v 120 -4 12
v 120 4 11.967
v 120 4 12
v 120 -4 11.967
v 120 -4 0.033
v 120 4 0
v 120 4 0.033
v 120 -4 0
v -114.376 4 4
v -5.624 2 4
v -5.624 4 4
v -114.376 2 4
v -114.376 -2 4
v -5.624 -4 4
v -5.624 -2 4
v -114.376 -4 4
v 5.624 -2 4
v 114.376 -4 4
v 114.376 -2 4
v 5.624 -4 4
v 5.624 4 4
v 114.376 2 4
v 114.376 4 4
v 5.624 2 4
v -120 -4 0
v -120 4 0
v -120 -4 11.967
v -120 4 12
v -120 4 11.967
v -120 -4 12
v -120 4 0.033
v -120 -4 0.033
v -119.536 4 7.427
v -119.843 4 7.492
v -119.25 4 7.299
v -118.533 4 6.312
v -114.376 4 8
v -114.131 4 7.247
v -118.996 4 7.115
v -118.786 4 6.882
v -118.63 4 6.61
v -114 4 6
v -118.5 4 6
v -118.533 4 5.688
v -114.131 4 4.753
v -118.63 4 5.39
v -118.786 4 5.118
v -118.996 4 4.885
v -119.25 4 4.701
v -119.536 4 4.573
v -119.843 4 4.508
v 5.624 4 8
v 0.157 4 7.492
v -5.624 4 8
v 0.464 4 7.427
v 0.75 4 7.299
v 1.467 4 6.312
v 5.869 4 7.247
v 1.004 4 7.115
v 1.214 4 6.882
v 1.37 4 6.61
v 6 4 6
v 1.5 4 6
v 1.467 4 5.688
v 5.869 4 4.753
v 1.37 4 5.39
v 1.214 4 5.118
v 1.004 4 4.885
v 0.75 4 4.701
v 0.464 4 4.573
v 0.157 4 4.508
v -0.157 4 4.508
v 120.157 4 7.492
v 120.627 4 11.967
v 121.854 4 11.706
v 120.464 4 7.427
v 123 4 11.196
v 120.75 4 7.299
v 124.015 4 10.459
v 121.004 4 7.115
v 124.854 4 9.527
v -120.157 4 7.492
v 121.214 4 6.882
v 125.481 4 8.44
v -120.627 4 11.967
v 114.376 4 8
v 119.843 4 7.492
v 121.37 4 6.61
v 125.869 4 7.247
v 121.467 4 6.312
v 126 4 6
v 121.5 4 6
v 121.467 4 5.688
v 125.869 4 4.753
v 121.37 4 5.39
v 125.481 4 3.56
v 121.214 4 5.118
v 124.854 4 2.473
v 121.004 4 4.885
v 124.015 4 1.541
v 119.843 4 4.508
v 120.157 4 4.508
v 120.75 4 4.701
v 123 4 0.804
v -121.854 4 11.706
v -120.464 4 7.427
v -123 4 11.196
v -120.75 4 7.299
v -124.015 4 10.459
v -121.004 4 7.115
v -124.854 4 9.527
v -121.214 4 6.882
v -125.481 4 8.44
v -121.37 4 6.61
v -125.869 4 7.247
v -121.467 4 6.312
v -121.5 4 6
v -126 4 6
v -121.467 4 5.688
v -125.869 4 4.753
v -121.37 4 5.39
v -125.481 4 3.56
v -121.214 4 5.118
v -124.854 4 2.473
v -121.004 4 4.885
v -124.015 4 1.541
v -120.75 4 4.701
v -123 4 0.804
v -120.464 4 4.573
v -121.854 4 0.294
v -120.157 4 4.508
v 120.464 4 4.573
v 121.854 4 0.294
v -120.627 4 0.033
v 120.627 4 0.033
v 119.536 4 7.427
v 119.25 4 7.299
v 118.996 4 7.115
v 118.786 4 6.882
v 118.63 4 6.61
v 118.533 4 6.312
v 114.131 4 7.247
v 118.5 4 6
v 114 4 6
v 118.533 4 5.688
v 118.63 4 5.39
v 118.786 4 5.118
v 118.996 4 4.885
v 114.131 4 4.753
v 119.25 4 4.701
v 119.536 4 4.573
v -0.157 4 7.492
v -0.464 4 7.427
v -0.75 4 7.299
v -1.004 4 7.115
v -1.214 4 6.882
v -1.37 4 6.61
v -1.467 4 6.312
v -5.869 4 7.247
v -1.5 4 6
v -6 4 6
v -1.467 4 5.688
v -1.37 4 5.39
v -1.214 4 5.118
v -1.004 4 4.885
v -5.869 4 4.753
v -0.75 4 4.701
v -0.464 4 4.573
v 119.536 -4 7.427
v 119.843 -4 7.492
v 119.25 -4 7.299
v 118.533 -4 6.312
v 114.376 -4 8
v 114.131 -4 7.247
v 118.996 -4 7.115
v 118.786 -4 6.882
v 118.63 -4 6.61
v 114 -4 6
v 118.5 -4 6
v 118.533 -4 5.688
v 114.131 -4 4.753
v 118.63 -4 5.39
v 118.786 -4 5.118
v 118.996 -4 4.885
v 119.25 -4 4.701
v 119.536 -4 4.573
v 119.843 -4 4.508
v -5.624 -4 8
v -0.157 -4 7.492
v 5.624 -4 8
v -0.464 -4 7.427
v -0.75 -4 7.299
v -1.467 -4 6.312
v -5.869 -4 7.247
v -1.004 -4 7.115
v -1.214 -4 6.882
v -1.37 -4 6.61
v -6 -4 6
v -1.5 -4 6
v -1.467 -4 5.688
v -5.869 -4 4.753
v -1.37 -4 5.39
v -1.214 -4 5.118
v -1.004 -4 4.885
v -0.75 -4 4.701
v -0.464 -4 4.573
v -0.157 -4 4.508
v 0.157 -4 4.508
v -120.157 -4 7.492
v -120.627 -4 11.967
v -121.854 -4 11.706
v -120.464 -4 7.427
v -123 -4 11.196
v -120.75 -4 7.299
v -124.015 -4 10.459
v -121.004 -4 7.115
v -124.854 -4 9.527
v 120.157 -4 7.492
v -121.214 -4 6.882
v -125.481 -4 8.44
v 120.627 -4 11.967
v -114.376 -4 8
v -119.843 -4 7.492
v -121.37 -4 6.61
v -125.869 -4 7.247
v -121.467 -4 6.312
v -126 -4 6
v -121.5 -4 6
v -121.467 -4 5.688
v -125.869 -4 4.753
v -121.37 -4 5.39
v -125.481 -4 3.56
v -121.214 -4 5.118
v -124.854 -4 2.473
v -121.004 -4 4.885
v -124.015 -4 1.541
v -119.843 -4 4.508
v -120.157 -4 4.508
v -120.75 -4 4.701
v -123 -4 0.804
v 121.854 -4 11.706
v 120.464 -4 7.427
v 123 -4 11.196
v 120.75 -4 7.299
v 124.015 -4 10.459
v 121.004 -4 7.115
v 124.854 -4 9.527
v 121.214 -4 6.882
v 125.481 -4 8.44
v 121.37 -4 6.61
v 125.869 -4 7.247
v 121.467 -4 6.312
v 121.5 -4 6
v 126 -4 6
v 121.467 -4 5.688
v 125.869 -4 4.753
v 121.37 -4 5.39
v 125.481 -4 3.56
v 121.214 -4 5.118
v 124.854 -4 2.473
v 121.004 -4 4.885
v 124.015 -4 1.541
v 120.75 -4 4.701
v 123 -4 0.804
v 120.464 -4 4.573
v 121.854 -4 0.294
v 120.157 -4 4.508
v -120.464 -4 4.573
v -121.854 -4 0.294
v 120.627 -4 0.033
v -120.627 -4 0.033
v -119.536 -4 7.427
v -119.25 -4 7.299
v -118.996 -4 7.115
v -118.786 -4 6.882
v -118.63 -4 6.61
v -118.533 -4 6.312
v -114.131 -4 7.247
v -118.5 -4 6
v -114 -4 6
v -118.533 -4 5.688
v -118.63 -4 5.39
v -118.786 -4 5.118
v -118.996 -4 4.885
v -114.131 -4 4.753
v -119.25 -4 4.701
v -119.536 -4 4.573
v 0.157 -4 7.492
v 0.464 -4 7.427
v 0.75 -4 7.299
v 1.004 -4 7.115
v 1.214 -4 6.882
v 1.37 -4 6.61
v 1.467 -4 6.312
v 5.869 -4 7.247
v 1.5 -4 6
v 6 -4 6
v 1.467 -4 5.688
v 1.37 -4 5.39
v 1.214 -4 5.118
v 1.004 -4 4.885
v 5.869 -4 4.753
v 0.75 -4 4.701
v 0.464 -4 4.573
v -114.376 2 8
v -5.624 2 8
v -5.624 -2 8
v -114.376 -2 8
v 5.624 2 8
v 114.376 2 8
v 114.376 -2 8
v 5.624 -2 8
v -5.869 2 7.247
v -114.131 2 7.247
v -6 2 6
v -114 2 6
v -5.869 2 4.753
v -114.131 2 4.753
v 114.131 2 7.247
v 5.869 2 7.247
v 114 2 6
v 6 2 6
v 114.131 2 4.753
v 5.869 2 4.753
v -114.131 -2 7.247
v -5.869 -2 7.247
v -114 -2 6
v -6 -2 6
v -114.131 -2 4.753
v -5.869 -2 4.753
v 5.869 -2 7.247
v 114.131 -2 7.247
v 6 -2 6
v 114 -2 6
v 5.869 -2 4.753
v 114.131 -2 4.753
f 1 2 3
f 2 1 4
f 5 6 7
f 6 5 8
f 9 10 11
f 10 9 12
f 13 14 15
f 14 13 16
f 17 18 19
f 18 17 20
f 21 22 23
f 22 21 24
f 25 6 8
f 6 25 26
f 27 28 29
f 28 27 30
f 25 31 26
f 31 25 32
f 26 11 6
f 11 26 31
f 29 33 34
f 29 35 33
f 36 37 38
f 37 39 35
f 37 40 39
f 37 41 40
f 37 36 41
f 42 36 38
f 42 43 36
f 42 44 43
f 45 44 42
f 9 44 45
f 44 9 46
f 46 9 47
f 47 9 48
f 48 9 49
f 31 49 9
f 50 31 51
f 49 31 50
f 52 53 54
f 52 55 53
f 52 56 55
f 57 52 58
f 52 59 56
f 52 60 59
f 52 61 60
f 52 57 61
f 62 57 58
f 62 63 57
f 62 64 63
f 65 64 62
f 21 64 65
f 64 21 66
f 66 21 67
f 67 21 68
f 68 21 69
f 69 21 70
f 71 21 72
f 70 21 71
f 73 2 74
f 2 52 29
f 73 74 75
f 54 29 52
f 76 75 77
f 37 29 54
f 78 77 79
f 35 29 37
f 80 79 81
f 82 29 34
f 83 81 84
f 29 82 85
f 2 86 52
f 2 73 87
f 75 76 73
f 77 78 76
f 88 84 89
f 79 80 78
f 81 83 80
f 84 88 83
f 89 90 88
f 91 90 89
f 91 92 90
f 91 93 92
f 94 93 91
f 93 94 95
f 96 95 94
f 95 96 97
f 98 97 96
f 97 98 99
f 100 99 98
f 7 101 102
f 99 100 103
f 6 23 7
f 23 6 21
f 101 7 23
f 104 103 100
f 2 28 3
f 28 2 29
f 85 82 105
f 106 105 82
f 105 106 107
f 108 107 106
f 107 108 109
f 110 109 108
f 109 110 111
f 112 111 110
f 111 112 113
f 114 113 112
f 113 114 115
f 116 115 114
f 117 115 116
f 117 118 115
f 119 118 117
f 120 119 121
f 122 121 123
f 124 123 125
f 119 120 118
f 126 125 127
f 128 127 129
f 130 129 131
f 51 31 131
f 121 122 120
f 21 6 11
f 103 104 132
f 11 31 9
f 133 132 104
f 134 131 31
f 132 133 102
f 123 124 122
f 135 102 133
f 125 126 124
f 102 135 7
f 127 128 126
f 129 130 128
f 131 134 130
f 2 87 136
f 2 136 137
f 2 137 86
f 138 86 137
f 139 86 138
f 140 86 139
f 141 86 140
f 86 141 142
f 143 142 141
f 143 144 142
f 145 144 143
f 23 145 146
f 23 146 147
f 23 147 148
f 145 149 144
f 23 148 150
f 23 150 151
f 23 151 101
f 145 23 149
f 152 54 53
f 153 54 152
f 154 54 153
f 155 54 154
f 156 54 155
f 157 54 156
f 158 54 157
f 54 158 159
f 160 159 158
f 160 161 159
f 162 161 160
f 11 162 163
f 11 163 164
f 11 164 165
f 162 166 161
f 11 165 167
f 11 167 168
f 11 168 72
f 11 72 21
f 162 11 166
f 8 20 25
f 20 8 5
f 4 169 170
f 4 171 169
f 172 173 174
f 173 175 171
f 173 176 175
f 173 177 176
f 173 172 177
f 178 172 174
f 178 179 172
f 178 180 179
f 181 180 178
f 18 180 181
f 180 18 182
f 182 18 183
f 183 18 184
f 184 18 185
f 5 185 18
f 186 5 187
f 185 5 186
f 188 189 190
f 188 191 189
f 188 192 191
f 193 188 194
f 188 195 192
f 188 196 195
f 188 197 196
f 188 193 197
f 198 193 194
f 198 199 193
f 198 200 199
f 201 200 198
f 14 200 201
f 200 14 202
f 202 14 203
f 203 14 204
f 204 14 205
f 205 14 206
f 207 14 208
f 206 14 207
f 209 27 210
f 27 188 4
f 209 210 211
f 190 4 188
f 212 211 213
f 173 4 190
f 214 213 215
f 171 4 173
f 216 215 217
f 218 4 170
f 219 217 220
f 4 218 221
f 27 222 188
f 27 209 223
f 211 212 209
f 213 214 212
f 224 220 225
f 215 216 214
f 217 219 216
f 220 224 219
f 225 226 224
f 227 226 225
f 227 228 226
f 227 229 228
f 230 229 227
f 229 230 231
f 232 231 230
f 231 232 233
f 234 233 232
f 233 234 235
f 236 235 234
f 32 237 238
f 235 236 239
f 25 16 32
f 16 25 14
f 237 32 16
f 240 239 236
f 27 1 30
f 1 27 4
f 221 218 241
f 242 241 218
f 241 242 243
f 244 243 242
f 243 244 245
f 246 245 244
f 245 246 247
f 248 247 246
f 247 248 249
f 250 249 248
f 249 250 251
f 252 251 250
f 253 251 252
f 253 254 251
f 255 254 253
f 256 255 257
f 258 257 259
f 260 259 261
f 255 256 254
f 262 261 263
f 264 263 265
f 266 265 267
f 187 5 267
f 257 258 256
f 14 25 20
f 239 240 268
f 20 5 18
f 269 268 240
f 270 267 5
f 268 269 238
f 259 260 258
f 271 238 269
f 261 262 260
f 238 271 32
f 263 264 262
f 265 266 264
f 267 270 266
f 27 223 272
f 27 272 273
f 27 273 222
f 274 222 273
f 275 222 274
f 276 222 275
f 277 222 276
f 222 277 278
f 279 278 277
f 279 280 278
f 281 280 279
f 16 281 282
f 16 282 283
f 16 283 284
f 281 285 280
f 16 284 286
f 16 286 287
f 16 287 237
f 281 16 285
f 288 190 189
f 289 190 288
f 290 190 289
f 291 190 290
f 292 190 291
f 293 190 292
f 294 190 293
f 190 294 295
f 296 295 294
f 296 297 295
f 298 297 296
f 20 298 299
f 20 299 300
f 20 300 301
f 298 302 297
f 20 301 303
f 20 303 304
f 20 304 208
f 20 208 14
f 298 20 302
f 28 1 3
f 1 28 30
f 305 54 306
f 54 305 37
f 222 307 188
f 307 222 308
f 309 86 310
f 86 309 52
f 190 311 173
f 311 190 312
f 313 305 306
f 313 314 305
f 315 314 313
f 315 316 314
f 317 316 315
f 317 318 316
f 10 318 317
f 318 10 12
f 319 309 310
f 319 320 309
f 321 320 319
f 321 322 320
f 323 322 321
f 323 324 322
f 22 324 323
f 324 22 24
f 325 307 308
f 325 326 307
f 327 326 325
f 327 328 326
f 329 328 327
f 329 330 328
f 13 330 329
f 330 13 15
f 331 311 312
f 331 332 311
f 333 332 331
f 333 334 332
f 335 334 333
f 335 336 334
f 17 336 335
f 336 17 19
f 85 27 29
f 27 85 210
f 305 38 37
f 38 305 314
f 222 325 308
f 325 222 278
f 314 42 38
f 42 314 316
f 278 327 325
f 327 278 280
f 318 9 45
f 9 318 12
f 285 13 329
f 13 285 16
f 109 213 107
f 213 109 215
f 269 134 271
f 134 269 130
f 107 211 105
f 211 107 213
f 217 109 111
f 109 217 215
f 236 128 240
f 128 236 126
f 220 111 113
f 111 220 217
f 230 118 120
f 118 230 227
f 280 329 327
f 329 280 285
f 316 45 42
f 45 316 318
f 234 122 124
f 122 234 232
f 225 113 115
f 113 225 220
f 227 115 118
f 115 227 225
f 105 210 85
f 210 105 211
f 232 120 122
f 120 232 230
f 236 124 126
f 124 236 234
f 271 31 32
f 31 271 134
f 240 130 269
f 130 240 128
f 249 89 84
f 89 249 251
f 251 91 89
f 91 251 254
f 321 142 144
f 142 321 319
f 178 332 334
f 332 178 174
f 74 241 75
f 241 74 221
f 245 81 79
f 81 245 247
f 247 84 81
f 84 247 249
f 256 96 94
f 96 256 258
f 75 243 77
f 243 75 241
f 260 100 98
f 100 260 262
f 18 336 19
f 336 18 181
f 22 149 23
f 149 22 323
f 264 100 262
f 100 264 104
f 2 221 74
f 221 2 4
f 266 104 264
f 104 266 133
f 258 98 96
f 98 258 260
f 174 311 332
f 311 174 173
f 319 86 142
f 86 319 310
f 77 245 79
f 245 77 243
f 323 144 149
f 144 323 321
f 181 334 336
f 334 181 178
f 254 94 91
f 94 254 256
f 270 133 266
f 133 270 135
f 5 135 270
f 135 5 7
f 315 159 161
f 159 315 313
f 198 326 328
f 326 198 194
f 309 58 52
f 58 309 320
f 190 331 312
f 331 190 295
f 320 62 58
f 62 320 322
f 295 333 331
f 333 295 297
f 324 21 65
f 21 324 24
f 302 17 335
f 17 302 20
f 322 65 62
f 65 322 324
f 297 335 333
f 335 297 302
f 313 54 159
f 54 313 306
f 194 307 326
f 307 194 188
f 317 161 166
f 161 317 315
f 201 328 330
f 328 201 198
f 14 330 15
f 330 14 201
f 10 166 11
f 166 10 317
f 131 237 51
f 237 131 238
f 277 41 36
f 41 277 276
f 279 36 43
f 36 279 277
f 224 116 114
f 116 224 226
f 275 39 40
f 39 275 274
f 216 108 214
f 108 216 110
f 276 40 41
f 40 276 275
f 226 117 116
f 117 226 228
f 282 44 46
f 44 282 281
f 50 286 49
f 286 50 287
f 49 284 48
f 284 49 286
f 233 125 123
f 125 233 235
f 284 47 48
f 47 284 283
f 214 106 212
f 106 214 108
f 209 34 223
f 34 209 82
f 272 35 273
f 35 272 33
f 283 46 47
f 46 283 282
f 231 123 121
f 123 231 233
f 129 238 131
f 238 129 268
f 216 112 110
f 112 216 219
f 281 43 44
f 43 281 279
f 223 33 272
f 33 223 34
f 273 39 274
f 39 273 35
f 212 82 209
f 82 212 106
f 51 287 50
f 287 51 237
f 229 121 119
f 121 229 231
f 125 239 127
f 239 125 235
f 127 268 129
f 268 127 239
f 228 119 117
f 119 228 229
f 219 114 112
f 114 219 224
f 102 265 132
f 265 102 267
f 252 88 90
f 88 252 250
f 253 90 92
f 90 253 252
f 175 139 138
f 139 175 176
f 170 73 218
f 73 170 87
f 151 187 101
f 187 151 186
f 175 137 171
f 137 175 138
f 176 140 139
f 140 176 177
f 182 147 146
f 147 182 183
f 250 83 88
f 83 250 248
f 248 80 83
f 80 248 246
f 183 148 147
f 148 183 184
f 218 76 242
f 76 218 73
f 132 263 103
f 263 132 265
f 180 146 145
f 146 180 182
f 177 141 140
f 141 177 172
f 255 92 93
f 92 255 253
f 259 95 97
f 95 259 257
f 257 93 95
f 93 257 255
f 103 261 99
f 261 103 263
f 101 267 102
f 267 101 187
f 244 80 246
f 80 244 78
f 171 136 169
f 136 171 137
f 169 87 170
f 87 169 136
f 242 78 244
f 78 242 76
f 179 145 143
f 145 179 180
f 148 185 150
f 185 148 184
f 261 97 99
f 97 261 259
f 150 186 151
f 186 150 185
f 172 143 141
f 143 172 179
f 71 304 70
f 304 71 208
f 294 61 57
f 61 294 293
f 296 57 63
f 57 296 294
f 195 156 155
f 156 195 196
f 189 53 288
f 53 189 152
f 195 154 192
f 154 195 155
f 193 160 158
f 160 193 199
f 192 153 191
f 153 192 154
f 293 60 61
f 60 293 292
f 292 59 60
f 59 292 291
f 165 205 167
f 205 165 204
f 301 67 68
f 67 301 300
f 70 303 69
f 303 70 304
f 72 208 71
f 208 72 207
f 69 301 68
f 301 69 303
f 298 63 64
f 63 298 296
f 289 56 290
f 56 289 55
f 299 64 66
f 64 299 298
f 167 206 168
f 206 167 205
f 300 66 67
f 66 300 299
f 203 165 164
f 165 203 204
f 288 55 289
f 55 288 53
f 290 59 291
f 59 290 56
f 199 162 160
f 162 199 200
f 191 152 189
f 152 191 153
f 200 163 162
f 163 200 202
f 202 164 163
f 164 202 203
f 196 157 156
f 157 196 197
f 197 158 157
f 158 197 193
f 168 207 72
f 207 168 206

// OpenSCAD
/*
Robot scissor lift components for FTC Team #11587
Kurt Kochendarfer
January 2017
*/


module makeLowerFlange() {
    color("black",0.75) {
        cube(size=[240,8,4], center = true);
    }
}

module makeUpperFlange() {
    color("black",0.75) {
        translate ([0,0,8])
            cube(size=[240,8,4], center = true);
    }
}

module makeWeb() {
    color("black",0.75) {
        translate([0,0,4])
            cube(size=[240,4,8], center = true);
    }
}

module makeLHole() {
    color("blue",0.75) {
        translate([-120,0,4])
            rotate([90,0,0]) {
                cylinder (h=10,d=3,center=true,$fn=30);
            }
    }
}

module makeRHole() {
    color("blue",0.75) {
        translate([120,0,4])
            rotate([90,0,0]) {
                cylinder (h=10,d=3,center=true,$fn=30);
            }
            
    }
}

module makeMiddleHole() {
    color("blue",0.75) {
        translate([0,0,4])
            rotate([90,0,0]) {
                cylinder (h=10,d=3,center=true,$fn=30);
            }
    }
}
    
module makeRoundLEnd() {
    color("black",0.75) {
        translate([-120,0,4])
            rotate([90,0,0]) {
                cylinder (h=8,d=12,center=true,$fn=30);
            }
    }
}

module makeRoundREnd() {
    color("black",0.75) {
        translate([120,0,4])
            rotate([90,0,0]) {
                cylinder (h=8,d=12,center=true,$fn=30);
            }
            
        }    
}

module makeRoundMiddle() {
    color("black",0.75) {
        translate([0,0,4])
            rotate([90,0,0]) {
                cylinder (h=8,d=12,center=true,$fn=30);
            }
    }
}


module makeIBeam() {
    makeLowerFlange();
    makeUpperFlange();
    makeWeb();
    makeRoundLEnd();
    makeRoundREnd();
    makeRoundMiddle();
}

module makeHoles() {
    makeLHole();
    makeRHole();
    makeMiddleHole();
}

module makeObject() {
    difference() {
        makeIBeam();
        makeHoles();
    }
}

translate([0,0,2])
    makeObject();
